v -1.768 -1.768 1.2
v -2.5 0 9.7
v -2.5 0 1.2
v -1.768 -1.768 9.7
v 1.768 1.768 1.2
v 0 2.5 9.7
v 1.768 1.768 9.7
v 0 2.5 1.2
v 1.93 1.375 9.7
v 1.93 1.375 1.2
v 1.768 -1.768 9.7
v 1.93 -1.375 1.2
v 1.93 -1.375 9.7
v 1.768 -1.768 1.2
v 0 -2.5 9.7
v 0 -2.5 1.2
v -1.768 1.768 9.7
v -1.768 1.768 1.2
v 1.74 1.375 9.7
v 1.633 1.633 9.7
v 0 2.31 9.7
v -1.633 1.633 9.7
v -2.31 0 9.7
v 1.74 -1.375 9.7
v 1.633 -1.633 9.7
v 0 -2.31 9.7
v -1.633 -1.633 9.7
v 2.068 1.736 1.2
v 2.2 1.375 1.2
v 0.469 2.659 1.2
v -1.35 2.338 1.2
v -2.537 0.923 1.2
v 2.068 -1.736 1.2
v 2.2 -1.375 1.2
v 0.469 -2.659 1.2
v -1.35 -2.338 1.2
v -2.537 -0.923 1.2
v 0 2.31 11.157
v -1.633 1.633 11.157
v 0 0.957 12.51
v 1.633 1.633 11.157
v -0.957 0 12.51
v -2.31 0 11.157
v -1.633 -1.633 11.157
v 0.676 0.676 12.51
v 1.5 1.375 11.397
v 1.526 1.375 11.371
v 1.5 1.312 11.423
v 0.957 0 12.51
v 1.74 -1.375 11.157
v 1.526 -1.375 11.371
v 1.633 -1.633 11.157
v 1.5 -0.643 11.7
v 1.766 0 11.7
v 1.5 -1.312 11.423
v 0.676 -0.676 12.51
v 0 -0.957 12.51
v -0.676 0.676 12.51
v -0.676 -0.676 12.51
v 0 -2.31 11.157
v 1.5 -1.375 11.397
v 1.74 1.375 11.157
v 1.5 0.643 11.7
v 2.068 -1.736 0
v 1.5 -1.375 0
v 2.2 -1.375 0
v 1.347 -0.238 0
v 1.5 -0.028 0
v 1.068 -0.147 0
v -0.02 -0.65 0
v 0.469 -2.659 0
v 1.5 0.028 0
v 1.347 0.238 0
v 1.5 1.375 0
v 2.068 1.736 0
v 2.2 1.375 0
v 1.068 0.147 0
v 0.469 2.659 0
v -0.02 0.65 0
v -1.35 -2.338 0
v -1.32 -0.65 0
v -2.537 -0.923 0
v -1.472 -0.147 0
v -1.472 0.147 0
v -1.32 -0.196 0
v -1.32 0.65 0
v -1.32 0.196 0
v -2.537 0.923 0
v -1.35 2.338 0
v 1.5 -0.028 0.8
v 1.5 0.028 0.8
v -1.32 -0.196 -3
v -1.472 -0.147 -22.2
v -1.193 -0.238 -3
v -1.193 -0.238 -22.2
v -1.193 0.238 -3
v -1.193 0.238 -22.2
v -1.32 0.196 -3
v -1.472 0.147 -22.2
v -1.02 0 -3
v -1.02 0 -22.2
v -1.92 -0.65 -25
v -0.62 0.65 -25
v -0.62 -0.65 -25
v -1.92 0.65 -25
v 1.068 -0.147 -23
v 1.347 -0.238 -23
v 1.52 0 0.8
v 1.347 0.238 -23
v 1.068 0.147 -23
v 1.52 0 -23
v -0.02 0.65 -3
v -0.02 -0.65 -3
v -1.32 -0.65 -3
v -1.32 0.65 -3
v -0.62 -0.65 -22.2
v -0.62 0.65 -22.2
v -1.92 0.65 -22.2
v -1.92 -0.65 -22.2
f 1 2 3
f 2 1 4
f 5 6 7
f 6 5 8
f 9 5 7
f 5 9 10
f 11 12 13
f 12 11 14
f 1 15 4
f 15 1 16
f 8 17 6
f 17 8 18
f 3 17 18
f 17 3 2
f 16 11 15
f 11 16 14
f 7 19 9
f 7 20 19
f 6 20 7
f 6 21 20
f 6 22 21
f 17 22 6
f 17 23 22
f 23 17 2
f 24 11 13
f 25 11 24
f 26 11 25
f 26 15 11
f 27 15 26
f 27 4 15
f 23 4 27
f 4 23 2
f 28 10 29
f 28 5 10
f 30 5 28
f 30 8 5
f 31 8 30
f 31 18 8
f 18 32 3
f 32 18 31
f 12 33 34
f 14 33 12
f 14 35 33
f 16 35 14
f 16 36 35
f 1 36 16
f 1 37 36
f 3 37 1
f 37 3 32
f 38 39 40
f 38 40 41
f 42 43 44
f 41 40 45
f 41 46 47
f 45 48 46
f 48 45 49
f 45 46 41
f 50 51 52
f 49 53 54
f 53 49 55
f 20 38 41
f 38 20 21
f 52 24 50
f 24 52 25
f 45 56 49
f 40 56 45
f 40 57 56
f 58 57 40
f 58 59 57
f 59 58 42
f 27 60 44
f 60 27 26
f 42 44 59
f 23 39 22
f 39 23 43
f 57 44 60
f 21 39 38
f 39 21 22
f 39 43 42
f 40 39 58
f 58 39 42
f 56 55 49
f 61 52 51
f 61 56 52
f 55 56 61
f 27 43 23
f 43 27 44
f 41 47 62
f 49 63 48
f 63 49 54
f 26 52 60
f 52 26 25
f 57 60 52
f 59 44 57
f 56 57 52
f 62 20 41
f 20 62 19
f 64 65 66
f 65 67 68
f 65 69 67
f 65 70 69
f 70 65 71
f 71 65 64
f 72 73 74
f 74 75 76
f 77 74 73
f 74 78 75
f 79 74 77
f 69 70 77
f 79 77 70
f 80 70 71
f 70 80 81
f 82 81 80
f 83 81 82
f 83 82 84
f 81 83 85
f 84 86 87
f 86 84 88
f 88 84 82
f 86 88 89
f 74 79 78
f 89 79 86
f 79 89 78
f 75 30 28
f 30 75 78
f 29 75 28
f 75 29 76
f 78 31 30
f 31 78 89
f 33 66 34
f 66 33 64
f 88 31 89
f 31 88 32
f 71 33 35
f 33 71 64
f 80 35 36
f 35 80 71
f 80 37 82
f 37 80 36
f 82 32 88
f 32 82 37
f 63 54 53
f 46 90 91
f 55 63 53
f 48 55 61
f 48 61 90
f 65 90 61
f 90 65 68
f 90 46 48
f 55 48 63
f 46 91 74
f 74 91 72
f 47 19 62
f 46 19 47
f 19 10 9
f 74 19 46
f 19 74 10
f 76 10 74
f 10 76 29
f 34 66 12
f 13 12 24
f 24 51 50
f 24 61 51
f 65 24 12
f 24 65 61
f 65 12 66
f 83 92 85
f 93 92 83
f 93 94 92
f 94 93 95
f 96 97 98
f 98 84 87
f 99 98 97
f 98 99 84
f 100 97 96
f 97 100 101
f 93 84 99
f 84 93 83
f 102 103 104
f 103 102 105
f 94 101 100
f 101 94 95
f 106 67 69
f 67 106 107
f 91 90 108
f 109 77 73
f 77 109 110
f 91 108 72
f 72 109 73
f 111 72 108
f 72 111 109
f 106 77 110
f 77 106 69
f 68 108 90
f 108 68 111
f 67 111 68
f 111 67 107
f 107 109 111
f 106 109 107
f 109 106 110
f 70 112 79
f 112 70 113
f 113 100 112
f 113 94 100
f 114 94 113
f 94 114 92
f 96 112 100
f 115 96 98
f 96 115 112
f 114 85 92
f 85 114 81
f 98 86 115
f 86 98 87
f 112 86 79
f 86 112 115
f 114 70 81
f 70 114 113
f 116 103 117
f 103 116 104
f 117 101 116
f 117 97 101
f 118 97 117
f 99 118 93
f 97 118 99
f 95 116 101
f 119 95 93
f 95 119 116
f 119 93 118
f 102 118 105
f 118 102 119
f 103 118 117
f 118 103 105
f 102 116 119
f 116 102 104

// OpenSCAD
// Parameters
body_diameter = 5.0; //[2.5:10.0:0.1]
body_height = 8.5; //[4.25:17.0:0.1]
base_thickness = 1.2; //[0.6:2.4:0.1]
base_diameter_factor = 1.08; //[1.02:1.2:0.01]
dome_height = 2.0; //[1.0:4.0:0.1]
lead_diameter = 0.5; //[0.25:1.0:0.05]
lead_spacing = 2.54; //[1.27:5.08:0.01]
lead_length = 25.0; //[12.5:50.0:0.5]
lead_length_delta = 2.0; //[0.0:6.0:0.1]
lead_bend_start = 3.0; //[1.0:8.0:0.1]
lead_bend_offset = 0.6; //[0.0:2.0:0.05]
overlap = 0.8; //[0.2:2.0:0.1]
flat_side_depth = 0.6; //[0.2:1.5:0.05]
flat_side_width_factor = 0.55; //[0.3:0.8:0.01]
internal_die_size_factor = 0.22; //[0.1:0.4:0.01]
internal_die_height = 0.8; //[0.3:2.0:0.1]
lead_tip_chamfer_height = 0.8; //[0.2:2.0:0.1]

// LED Body
module led_body() {
  color([0.85, 0.85, 0.8]) // Off-white for LED lens
  union() {
    translate([0, 0, base_thickness + body_height/2])
      cylinder(r=body_diameter/2, h=body_height, center=true);
    translate([0, 0, base_thickness + body_height + (body_diameter/2 - dome_height)])
      sphere(r=body_diameter/2, center=true);
  }
}

// LED Base
module led_base() {
  color([0.85, 0.85, 0.8]) // Off-white for LED base
  translate([0, 0, base_thickness/2])
    cylinder(r=(body_diameter*base_diameter_factor)/2, h=base_thickness, center=true);
}

// Flat Side on Body
module flat_side_on_body() {
  translate([body_diameter/2 - flat_side_depth/2, 0, (base_thickness + body_height + dome_height)/2])
    cube([flat_side_depth + overlap, body_diameter*flat_side_width_factor, body_height + dome_height + base_thickness], center=true);
}

// Leads
module leads() {
  color("Silver") // Silver for metal leads
  union() {
    translate([-lead_spacing/2, 0, -(lead_length/2) + overlap/2])
      cylinder(r=lead_diameter/2, h=lead_length + overlap, center=true);
    translate([lead_spacing/2, 0, -((lead_length - lead_length_delta)/2) + overlap/2])
      cylinder(r=lead_diameter/2, h=lead_length - lead_length_delta + overlap, center=true);
    translate([-lead_spacing/2 + lead_bend_offset, 0, -lead_bend_start/2 + overlap/2])
      cube([lead_diameter + overlap, lead_diameter + overlap, lead_bend_start + overlap], center=true);
    translate([-lead_spacing/2, 0, -lead_length + lead_length_delta/2 + overlap/2])
      cube([lead_diameter + overlap, lead_diameter + overlap, lead_length_delta + overlap], center=true);
    translate([-lead_spacing/2, 0, -lead_length - lead_tip_chamfer_height/2 + overlap])
      rotate([180, 0, 0])
      cylinder(r1=lead_diameter/2, r2=0, h=lead_tip_chamfer_height, center=true);
    translate([lead_spacing/2, 0, -(lead_length - lead_length_delta) - lead_tip_chamfer_height/2 + overlap])
      rotate([180, 0, 0])
      cylinder(r1=lead_diameter/2, r2=0, h=lead_tip_chamfer_height, center=true);
  }
}

// Internal Die Hint
module internal_die_hint() {
  color("Black") // Black for internal die
  translate([0, 0, base_thickness + internal_die_height/2 + overlap])
    cube([body_diameter*internal_die_size_factor, body_diameter*internal_die_size_factor, internal_die_height], center=true);
}

// LED Complete Model
module led_complete_model() {
  union() {
    difference() {
      union() {
        led_base();
        led_body();
      }
      flat_side_on_body();
    }
    leads();
    internal_die_hint();
  }
}

// Render the complete LED model
led_complete_model();
